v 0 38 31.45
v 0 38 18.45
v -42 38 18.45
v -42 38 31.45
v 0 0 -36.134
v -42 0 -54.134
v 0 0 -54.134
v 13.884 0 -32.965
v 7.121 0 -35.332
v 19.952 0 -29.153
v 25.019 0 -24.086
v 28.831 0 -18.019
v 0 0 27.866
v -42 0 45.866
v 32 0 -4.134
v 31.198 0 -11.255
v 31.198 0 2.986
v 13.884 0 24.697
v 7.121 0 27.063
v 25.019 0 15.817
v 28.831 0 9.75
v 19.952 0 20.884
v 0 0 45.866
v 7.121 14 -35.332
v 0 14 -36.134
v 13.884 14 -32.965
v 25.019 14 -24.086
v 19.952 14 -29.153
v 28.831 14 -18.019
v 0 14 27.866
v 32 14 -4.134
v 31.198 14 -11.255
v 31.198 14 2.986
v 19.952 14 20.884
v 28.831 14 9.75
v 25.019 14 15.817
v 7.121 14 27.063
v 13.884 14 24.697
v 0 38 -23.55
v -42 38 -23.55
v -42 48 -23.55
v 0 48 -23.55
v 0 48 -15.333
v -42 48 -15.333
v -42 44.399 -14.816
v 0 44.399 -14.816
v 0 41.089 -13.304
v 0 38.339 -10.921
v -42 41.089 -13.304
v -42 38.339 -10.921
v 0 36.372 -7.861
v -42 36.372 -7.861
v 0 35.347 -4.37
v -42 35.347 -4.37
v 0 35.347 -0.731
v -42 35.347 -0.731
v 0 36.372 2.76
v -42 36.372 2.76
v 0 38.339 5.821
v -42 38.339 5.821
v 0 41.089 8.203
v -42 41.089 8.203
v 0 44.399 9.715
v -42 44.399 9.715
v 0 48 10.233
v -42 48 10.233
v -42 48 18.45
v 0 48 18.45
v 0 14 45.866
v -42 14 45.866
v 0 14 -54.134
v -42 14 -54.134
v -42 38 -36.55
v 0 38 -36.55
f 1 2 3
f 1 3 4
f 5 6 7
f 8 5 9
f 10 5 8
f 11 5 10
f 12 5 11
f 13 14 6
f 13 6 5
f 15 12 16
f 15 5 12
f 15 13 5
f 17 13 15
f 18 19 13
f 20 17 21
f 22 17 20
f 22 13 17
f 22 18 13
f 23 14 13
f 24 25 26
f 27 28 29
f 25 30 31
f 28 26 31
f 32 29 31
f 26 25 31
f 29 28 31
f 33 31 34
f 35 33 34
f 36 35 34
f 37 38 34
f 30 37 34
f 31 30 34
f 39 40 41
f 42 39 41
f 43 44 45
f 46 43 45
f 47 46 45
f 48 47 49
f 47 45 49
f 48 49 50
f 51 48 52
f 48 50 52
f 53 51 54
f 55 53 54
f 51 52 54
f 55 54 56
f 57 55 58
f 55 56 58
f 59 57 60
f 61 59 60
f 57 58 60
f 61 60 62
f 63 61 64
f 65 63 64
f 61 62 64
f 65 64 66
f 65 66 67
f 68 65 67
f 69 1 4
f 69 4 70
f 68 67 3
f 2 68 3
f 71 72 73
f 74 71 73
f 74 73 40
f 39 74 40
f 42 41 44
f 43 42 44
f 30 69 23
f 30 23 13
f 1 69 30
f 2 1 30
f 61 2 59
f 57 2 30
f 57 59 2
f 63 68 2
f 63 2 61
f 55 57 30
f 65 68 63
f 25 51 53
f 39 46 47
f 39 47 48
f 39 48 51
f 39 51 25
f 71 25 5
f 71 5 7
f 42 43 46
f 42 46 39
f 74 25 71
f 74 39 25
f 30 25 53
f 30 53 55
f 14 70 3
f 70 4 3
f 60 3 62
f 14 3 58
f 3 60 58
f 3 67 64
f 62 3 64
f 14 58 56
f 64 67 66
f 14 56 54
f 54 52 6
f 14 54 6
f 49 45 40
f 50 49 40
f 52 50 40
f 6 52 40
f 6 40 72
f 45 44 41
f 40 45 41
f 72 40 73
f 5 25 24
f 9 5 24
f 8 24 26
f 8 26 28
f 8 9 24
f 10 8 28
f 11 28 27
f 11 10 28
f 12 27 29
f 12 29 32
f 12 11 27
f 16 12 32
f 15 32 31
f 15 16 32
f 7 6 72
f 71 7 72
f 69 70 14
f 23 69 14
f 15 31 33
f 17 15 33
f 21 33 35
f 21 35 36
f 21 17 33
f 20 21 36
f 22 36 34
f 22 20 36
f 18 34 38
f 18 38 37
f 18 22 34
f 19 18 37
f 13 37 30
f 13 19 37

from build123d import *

# Parameters (mm, degrees)
BOSS_EXTRUDE1_DEPTH = 21
BOSS_EXTRUDE2_DEPTH = 14


with BuildPart() as part:
    # Sketch1 → Boss-Extrude1 (new body)
    with BuildSketch(Plane(origin=(0, 0, 0), x_dir=(0, 0, -1), z_dir=(1, 0, 0))):
        with BuildLine():
            Line((-45.865633075, 14), (-45.865633075, 0))
            Line((-45.865633075, 0), (54.134366925, 0))
            Line((54.134366925, 0), (54.134366925, 14))
            Line((54.134366925, 14), (36.550387597, 38))
            Line((36.550387597, 38), (23.550387597, 38))
            Line((23.550387597, 38), (23.550387597, 48))
            Line((23.550387597, 48), (15.333333333, 48))
            ThreePointArc((15.333333333, 48), (2.550387597, 35.217054264), (-10.23255814, 48))
            Line((-10.23255814, 48), (-18.449612403, 48))
            Line((-18.449612403, 48), (-18.449612403, 38))
            Line((-18.449612403, 38), (-31.449612403, 38))
            Line((-31.449612403, 38), (-45.865633075, 14))
        make_face()
    extrude(amount=-BOSS_EXTRUDE1_DEPTH)

    # Mirror1: part across plane


with BuildPart() as part_1:
    add(part.part)
    add(part.part.mirror(Plane.ZY.offset(21)))

    # Sketch3 → Boss-Extrude2 (add)
    with BuildSketch(Plane.XZ):
        with BuildLine():
            Line((0, 27.865633075), (0, 24.200007191))
            Line((0, 24.200007191), (0, -20.725134363))
            Line((0, -20.725134363), (0, -36.134366925))
            ThreePointArc((0, -36.134366925), (22.627416998, -26.761783923), (32, -4.134366925))
            ThreePointArc((32, -4.134366925), (22.627416998, 18.493050073), (0, 27.865633075))
        make_face()
        with BuildLine():
            Line((0, -20.725134363), (0, 24.200007191))
            Line((0, 24.200007191), (0, 27.865633075))
            ThreePointArc((0, 27.865633075), (-32, -4.134366925), (0, -36.134366925))
            Line((0, -36.134366925), (0, -20.725134363))
        make_face()
    extrude(amount=-BOSS_EXTRUDE2_DEPTH)


solid = part_1.part
